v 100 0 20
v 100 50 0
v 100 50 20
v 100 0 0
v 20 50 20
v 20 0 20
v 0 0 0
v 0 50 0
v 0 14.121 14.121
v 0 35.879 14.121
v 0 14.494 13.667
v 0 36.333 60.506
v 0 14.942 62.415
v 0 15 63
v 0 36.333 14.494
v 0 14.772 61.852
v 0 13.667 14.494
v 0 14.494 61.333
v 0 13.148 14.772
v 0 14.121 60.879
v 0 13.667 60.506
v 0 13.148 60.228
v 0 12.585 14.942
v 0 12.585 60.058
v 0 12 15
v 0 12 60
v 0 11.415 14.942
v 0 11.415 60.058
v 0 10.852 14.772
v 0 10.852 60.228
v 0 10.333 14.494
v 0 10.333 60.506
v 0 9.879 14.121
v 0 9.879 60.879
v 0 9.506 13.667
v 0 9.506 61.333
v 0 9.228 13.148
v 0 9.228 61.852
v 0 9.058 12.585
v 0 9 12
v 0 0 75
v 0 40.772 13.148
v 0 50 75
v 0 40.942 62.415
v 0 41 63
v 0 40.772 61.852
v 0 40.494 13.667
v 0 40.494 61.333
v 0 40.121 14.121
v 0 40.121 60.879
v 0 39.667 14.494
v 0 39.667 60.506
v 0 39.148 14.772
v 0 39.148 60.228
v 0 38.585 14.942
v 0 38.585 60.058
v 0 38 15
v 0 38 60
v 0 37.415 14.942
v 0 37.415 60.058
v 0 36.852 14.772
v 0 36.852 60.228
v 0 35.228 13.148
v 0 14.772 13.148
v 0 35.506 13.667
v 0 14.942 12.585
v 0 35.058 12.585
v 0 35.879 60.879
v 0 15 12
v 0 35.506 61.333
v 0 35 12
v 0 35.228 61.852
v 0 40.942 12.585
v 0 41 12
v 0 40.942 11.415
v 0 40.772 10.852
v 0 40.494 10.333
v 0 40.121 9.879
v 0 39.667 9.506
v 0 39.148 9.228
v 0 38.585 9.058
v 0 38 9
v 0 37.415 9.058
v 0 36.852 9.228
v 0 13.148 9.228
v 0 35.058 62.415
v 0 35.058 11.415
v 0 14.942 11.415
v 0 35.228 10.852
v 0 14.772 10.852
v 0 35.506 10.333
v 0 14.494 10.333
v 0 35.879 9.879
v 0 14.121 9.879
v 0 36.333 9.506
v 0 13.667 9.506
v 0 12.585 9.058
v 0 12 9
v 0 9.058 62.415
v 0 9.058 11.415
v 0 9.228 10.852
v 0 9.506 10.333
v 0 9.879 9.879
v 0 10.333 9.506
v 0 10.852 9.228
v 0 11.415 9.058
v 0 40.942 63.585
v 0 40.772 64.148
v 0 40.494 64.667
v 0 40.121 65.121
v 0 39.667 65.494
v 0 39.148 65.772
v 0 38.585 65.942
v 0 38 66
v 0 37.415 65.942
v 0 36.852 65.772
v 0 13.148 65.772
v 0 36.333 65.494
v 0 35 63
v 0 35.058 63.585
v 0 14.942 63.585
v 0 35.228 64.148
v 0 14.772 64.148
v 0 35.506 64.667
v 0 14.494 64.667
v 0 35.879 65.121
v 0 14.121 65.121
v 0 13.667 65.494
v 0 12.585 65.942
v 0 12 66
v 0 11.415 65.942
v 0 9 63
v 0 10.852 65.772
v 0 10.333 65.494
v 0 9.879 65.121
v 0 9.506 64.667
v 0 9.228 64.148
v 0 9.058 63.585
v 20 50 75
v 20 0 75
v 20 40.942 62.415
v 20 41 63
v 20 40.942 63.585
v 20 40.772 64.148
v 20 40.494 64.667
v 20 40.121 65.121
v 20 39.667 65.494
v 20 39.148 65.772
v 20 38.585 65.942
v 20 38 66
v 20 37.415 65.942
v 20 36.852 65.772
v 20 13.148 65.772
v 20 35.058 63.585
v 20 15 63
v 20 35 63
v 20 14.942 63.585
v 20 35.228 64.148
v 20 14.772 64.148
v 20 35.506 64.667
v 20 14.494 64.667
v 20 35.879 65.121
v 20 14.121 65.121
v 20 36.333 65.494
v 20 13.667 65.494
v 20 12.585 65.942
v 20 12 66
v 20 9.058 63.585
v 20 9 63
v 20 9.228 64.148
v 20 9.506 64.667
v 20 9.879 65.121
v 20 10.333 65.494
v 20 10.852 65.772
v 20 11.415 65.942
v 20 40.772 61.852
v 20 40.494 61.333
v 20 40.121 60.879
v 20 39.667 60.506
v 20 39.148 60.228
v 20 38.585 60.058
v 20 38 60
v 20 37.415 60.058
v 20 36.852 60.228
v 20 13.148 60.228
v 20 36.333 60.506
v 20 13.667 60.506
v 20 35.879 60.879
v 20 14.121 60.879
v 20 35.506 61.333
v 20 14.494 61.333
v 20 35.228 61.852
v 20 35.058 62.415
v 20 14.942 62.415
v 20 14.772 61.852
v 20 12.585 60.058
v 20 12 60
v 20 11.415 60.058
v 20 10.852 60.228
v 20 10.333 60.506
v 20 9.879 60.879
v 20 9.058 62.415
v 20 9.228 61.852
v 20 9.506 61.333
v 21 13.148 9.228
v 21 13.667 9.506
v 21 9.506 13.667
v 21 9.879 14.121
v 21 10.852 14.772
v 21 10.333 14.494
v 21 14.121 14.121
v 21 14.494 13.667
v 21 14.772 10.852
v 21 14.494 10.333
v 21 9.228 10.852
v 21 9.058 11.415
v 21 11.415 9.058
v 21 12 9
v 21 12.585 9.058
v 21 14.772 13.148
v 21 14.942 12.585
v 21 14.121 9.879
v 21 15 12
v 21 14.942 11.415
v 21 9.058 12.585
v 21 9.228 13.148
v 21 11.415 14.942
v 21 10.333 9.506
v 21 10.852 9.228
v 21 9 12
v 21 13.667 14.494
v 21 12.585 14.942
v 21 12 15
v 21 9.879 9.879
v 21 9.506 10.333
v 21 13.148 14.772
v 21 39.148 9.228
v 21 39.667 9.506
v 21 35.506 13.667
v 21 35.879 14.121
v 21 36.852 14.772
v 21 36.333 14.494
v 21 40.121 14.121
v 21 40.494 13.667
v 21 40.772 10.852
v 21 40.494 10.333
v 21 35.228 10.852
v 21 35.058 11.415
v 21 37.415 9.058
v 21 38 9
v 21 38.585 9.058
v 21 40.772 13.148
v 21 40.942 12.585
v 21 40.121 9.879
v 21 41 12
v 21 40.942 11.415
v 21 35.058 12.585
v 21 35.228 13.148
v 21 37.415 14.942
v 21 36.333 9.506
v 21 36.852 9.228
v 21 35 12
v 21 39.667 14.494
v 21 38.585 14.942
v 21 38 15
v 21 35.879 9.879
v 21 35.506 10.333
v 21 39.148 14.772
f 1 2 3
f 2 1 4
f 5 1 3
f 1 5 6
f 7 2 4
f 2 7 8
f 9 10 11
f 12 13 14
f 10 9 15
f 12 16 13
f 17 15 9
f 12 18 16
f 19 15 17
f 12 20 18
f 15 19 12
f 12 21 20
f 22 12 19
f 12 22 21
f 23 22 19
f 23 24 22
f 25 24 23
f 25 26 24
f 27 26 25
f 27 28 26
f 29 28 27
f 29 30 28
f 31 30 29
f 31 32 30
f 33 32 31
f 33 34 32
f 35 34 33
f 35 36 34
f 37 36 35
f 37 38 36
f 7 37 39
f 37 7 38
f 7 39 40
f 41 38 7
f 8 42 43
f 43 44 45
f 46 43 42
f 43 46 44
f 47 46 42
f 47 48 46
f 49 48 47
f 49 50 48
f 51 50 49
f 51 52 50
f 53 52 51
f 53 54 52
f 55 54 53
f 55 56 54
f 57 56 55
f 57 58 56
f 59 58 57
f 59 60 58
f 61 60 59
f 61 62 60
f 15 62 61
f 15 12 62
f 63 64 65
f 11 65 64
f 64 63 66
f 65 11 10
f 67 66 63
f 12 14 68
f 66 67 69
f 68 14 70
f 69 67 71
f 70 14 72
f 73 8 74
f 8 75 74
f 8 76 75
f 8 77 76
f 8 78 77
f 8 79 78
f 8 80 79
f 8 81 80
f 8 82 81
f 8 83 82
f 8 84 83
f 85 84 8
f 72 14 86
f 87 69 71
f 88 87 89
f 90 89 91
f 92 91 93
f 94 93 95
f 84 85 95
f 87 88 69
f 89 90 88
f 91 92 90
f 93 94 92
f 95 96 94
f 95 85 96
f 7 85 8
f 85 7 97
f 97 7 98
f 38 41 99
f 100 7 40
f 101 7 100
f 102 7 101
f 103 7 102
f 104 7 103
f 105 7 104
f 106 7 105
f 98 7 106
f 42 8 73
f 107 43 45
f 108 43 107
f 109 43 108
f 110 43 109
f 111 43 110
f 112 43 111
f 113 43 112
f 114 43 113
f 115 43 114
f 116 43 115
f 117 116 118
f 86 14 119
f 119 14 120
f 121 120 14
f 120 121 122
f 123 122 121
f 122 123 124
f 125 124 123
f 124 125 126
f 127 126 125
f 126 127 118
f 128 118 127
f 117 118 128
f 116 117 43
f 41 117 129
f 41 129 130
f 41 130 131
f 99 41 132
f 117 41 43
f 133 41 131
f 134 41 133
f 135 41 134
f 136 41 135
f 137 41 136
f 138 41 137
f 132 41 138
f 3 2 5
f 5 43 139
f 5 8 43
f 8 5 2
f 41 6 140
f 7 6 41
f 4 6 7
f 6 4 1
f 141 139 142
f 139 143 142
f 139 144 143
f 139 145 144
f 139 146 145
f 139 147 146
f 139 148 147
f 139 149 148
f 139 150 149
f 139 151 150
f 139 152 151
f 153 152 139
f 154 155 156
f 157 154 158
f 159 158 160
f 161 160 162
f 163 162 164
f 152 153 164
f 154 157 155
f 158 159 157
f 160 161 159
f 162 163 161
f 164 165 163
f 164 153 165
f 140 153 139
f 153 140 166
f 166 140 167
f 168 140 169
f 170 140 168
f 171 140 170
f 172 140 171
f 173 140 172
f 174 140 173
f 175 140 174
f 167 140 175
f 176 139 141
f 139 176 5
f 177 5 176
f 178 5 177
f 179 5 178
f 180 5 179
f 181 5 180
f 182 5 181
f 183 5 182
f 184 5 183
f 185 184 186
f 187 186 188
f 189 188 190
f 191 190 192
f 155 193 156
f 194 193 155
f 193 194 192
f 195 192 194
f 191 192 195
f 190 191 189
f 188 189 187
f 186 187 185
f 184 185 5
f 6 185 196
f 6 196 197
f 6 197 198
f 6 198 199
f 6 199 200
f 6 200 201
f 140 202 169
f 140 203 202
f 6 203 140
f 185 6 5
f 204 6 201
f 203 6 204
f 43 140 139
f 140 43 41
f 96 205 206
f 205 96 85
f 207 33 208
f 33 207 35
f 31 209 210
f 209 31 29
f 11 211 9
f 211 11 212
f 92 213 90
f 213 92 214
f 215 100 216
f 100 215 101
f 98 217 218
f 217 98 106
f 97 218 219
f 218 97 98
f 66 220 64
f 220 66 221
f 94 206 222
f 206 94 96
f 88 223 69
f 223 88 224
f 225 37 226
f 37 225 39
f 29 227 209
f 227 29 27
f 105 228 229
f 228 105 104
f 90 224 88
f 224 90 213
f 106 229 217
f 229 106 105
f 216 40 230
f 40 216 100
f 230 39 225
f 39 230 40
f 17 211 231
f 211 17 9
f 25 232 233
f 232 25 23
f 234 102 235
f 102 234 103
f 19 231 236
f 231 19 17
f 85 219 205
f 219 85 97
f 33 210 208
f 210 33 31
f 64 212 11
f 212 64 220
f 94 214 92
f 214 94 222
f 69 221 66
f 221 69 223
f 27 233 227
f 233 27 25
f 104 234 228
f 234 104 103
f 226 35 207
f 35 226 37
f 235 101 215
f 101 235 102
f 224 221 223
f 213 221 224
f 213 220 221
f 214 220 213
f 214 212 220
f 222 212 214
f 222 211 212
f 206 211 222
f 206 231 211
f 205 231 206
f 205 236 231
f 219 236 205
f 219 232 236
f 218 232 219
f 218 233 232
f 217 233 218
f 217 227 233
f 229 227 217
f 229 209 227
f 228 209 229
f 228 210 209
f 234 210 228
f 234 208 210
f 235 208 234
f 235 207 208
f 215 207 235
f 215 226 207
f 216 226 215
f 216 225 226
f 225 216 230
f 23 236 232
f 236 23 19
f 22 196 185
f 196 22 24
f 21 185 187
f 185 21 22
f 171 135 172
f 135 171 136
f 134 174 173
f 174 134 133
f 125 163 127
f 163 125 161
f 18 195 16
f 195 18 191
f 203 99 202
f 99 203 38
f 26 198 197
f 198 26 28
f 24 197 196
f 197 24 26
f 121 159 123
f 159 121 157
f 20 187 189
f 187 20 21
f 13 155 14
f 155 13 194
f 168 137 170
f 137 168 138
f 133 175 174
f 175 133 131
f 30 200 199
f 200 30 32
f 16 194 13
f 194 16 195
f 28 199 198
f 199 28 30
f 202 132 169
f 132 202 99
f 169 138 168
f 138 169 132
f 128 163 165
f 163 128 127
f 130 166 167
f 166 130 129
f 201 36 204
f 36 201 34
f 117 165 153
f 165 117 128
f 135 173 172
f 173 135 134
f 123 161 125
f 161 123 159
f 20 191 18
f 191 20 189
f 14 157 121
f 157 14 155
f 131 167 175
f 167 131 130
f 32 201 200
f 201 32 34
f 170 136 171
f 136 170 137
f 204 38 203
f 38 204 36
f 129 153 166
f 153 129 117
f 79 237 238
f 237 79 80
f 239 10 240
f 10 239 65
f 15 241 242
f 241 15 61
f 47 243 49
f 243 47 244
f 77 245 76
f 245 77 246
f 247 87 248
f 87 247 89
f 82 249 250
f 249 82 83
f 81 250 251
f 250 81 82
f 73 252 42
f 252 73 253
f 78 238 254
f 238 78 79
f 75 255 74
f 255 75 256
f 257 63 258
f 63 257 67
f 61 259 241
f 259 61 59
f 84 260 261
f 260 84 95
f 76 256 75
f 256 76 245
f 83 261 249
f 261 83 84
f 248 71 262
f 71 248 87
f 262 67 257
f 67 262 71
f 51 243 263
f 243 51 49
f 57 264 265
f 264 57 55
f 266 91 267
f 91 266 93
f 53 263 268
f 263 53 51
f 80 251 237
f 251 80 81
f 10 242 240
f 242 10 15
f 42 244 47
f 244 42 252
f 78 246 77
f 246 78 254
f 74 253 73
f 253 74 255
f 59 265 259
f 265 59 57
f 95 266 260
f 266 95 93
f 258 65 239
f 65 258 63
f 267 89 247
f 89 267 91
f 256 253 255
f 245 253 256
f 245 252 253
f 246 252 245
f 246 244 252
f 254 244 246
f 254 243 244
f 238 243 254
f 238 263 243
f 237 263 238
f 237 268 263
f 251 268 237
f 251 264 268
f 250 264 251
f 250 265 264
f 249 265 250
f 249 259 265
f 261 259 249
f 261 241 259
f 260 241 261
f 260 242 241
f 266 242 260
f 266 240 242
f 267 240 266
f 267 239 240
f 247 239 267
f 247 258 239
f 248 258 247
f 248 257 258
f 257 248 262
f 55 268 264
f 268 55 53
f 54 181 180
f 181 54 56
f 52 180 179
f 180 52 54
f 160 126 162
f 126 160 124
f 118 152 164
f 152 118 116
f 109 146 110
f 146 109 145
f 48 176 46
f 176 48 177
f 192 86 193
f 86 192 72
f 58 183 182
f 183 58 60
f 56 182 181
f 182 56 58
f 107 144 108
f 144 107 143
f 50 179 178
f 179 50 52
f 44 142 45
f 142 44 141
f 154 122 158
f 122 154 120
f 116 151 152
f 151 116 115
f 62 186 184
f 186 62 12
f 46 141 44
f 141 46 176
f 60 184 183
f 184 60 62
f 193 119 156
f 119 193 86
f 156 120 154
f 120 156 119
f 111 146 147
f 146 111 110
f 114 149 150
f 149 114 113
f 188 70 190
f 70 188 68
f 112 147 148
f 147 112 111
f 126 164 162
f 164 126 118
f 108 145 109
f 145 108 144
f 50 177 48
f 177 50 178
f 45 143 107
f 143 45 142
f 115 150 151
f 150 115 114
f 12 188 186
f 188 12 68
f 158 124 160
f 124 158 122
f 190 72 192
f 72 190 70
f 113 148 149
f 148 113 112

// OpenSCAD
// scad/cantilever_arm.scad
// Parametric cantilever arm bracket.
// Fixed at the back wall plate (4 mounting holes on the vertical face),
// load applied downward on the tip of the horizontal arm.
//
// All caps variables are injected via -D flags from openscad_runner.py.

// ── Parameters ────────────────────────────────────────────────────────────
LENGTH                 = 100.0;  // total length of arm (X)
WIDTH                  = 50.0;   // width into page (Y)
HEIGHT                 = 75.0;   // total height (Z) — arm at bottom, wall above
ARM_THICKNESS          = 20.0;   // Z thickness of horizontal arm
WALL_THICKNESS         = 20.0;   // X depth of back wall
MOUNTING_HOLE_DIAMETER = 6.0;
MOUNTING_HOLE_INSET    = 12.0;

// ── Derived ───────────────────────────────────────────────────────────────
hole_r   = MOUNTING_HOLE_DIAMETER / 2;
fn_curve = 32;

// ── Simple L-body ─────────────────────────────────────────────────────────
module l_body() {
    union() {
        // Horizontal arm: full length, bottom portion
        cube([LENGTH, WIDTH, ARM_THICKNESS]);
        // Vertical wall: back portion, full height
        cube([WALL_THICKNESS, WIDTH, HEIGHT]);
    }
}

// ── Mounting holes through the back wall (drilled in X direction) ─────────
module mounting_holes() {
    inset = MOUNTING_HOLE_INSET;
    y_positions = [inset, WIDTH - inset];
    z_positions = [inset, HEIGHT - inset];
    for (y = y_positions) {
        for (z = z_positions) {
            translate([-1, y, z])
                rotate([0, 90, 0])
                    cylinder(r=hole_r, h=WALL_THICKNESS + 2, $fn=fn_curve);
        }
    }
}

// ── Assembly ──────────────────────────────────────────────────────────────
difference() {
    l_body();
    mounting_holes();
}
